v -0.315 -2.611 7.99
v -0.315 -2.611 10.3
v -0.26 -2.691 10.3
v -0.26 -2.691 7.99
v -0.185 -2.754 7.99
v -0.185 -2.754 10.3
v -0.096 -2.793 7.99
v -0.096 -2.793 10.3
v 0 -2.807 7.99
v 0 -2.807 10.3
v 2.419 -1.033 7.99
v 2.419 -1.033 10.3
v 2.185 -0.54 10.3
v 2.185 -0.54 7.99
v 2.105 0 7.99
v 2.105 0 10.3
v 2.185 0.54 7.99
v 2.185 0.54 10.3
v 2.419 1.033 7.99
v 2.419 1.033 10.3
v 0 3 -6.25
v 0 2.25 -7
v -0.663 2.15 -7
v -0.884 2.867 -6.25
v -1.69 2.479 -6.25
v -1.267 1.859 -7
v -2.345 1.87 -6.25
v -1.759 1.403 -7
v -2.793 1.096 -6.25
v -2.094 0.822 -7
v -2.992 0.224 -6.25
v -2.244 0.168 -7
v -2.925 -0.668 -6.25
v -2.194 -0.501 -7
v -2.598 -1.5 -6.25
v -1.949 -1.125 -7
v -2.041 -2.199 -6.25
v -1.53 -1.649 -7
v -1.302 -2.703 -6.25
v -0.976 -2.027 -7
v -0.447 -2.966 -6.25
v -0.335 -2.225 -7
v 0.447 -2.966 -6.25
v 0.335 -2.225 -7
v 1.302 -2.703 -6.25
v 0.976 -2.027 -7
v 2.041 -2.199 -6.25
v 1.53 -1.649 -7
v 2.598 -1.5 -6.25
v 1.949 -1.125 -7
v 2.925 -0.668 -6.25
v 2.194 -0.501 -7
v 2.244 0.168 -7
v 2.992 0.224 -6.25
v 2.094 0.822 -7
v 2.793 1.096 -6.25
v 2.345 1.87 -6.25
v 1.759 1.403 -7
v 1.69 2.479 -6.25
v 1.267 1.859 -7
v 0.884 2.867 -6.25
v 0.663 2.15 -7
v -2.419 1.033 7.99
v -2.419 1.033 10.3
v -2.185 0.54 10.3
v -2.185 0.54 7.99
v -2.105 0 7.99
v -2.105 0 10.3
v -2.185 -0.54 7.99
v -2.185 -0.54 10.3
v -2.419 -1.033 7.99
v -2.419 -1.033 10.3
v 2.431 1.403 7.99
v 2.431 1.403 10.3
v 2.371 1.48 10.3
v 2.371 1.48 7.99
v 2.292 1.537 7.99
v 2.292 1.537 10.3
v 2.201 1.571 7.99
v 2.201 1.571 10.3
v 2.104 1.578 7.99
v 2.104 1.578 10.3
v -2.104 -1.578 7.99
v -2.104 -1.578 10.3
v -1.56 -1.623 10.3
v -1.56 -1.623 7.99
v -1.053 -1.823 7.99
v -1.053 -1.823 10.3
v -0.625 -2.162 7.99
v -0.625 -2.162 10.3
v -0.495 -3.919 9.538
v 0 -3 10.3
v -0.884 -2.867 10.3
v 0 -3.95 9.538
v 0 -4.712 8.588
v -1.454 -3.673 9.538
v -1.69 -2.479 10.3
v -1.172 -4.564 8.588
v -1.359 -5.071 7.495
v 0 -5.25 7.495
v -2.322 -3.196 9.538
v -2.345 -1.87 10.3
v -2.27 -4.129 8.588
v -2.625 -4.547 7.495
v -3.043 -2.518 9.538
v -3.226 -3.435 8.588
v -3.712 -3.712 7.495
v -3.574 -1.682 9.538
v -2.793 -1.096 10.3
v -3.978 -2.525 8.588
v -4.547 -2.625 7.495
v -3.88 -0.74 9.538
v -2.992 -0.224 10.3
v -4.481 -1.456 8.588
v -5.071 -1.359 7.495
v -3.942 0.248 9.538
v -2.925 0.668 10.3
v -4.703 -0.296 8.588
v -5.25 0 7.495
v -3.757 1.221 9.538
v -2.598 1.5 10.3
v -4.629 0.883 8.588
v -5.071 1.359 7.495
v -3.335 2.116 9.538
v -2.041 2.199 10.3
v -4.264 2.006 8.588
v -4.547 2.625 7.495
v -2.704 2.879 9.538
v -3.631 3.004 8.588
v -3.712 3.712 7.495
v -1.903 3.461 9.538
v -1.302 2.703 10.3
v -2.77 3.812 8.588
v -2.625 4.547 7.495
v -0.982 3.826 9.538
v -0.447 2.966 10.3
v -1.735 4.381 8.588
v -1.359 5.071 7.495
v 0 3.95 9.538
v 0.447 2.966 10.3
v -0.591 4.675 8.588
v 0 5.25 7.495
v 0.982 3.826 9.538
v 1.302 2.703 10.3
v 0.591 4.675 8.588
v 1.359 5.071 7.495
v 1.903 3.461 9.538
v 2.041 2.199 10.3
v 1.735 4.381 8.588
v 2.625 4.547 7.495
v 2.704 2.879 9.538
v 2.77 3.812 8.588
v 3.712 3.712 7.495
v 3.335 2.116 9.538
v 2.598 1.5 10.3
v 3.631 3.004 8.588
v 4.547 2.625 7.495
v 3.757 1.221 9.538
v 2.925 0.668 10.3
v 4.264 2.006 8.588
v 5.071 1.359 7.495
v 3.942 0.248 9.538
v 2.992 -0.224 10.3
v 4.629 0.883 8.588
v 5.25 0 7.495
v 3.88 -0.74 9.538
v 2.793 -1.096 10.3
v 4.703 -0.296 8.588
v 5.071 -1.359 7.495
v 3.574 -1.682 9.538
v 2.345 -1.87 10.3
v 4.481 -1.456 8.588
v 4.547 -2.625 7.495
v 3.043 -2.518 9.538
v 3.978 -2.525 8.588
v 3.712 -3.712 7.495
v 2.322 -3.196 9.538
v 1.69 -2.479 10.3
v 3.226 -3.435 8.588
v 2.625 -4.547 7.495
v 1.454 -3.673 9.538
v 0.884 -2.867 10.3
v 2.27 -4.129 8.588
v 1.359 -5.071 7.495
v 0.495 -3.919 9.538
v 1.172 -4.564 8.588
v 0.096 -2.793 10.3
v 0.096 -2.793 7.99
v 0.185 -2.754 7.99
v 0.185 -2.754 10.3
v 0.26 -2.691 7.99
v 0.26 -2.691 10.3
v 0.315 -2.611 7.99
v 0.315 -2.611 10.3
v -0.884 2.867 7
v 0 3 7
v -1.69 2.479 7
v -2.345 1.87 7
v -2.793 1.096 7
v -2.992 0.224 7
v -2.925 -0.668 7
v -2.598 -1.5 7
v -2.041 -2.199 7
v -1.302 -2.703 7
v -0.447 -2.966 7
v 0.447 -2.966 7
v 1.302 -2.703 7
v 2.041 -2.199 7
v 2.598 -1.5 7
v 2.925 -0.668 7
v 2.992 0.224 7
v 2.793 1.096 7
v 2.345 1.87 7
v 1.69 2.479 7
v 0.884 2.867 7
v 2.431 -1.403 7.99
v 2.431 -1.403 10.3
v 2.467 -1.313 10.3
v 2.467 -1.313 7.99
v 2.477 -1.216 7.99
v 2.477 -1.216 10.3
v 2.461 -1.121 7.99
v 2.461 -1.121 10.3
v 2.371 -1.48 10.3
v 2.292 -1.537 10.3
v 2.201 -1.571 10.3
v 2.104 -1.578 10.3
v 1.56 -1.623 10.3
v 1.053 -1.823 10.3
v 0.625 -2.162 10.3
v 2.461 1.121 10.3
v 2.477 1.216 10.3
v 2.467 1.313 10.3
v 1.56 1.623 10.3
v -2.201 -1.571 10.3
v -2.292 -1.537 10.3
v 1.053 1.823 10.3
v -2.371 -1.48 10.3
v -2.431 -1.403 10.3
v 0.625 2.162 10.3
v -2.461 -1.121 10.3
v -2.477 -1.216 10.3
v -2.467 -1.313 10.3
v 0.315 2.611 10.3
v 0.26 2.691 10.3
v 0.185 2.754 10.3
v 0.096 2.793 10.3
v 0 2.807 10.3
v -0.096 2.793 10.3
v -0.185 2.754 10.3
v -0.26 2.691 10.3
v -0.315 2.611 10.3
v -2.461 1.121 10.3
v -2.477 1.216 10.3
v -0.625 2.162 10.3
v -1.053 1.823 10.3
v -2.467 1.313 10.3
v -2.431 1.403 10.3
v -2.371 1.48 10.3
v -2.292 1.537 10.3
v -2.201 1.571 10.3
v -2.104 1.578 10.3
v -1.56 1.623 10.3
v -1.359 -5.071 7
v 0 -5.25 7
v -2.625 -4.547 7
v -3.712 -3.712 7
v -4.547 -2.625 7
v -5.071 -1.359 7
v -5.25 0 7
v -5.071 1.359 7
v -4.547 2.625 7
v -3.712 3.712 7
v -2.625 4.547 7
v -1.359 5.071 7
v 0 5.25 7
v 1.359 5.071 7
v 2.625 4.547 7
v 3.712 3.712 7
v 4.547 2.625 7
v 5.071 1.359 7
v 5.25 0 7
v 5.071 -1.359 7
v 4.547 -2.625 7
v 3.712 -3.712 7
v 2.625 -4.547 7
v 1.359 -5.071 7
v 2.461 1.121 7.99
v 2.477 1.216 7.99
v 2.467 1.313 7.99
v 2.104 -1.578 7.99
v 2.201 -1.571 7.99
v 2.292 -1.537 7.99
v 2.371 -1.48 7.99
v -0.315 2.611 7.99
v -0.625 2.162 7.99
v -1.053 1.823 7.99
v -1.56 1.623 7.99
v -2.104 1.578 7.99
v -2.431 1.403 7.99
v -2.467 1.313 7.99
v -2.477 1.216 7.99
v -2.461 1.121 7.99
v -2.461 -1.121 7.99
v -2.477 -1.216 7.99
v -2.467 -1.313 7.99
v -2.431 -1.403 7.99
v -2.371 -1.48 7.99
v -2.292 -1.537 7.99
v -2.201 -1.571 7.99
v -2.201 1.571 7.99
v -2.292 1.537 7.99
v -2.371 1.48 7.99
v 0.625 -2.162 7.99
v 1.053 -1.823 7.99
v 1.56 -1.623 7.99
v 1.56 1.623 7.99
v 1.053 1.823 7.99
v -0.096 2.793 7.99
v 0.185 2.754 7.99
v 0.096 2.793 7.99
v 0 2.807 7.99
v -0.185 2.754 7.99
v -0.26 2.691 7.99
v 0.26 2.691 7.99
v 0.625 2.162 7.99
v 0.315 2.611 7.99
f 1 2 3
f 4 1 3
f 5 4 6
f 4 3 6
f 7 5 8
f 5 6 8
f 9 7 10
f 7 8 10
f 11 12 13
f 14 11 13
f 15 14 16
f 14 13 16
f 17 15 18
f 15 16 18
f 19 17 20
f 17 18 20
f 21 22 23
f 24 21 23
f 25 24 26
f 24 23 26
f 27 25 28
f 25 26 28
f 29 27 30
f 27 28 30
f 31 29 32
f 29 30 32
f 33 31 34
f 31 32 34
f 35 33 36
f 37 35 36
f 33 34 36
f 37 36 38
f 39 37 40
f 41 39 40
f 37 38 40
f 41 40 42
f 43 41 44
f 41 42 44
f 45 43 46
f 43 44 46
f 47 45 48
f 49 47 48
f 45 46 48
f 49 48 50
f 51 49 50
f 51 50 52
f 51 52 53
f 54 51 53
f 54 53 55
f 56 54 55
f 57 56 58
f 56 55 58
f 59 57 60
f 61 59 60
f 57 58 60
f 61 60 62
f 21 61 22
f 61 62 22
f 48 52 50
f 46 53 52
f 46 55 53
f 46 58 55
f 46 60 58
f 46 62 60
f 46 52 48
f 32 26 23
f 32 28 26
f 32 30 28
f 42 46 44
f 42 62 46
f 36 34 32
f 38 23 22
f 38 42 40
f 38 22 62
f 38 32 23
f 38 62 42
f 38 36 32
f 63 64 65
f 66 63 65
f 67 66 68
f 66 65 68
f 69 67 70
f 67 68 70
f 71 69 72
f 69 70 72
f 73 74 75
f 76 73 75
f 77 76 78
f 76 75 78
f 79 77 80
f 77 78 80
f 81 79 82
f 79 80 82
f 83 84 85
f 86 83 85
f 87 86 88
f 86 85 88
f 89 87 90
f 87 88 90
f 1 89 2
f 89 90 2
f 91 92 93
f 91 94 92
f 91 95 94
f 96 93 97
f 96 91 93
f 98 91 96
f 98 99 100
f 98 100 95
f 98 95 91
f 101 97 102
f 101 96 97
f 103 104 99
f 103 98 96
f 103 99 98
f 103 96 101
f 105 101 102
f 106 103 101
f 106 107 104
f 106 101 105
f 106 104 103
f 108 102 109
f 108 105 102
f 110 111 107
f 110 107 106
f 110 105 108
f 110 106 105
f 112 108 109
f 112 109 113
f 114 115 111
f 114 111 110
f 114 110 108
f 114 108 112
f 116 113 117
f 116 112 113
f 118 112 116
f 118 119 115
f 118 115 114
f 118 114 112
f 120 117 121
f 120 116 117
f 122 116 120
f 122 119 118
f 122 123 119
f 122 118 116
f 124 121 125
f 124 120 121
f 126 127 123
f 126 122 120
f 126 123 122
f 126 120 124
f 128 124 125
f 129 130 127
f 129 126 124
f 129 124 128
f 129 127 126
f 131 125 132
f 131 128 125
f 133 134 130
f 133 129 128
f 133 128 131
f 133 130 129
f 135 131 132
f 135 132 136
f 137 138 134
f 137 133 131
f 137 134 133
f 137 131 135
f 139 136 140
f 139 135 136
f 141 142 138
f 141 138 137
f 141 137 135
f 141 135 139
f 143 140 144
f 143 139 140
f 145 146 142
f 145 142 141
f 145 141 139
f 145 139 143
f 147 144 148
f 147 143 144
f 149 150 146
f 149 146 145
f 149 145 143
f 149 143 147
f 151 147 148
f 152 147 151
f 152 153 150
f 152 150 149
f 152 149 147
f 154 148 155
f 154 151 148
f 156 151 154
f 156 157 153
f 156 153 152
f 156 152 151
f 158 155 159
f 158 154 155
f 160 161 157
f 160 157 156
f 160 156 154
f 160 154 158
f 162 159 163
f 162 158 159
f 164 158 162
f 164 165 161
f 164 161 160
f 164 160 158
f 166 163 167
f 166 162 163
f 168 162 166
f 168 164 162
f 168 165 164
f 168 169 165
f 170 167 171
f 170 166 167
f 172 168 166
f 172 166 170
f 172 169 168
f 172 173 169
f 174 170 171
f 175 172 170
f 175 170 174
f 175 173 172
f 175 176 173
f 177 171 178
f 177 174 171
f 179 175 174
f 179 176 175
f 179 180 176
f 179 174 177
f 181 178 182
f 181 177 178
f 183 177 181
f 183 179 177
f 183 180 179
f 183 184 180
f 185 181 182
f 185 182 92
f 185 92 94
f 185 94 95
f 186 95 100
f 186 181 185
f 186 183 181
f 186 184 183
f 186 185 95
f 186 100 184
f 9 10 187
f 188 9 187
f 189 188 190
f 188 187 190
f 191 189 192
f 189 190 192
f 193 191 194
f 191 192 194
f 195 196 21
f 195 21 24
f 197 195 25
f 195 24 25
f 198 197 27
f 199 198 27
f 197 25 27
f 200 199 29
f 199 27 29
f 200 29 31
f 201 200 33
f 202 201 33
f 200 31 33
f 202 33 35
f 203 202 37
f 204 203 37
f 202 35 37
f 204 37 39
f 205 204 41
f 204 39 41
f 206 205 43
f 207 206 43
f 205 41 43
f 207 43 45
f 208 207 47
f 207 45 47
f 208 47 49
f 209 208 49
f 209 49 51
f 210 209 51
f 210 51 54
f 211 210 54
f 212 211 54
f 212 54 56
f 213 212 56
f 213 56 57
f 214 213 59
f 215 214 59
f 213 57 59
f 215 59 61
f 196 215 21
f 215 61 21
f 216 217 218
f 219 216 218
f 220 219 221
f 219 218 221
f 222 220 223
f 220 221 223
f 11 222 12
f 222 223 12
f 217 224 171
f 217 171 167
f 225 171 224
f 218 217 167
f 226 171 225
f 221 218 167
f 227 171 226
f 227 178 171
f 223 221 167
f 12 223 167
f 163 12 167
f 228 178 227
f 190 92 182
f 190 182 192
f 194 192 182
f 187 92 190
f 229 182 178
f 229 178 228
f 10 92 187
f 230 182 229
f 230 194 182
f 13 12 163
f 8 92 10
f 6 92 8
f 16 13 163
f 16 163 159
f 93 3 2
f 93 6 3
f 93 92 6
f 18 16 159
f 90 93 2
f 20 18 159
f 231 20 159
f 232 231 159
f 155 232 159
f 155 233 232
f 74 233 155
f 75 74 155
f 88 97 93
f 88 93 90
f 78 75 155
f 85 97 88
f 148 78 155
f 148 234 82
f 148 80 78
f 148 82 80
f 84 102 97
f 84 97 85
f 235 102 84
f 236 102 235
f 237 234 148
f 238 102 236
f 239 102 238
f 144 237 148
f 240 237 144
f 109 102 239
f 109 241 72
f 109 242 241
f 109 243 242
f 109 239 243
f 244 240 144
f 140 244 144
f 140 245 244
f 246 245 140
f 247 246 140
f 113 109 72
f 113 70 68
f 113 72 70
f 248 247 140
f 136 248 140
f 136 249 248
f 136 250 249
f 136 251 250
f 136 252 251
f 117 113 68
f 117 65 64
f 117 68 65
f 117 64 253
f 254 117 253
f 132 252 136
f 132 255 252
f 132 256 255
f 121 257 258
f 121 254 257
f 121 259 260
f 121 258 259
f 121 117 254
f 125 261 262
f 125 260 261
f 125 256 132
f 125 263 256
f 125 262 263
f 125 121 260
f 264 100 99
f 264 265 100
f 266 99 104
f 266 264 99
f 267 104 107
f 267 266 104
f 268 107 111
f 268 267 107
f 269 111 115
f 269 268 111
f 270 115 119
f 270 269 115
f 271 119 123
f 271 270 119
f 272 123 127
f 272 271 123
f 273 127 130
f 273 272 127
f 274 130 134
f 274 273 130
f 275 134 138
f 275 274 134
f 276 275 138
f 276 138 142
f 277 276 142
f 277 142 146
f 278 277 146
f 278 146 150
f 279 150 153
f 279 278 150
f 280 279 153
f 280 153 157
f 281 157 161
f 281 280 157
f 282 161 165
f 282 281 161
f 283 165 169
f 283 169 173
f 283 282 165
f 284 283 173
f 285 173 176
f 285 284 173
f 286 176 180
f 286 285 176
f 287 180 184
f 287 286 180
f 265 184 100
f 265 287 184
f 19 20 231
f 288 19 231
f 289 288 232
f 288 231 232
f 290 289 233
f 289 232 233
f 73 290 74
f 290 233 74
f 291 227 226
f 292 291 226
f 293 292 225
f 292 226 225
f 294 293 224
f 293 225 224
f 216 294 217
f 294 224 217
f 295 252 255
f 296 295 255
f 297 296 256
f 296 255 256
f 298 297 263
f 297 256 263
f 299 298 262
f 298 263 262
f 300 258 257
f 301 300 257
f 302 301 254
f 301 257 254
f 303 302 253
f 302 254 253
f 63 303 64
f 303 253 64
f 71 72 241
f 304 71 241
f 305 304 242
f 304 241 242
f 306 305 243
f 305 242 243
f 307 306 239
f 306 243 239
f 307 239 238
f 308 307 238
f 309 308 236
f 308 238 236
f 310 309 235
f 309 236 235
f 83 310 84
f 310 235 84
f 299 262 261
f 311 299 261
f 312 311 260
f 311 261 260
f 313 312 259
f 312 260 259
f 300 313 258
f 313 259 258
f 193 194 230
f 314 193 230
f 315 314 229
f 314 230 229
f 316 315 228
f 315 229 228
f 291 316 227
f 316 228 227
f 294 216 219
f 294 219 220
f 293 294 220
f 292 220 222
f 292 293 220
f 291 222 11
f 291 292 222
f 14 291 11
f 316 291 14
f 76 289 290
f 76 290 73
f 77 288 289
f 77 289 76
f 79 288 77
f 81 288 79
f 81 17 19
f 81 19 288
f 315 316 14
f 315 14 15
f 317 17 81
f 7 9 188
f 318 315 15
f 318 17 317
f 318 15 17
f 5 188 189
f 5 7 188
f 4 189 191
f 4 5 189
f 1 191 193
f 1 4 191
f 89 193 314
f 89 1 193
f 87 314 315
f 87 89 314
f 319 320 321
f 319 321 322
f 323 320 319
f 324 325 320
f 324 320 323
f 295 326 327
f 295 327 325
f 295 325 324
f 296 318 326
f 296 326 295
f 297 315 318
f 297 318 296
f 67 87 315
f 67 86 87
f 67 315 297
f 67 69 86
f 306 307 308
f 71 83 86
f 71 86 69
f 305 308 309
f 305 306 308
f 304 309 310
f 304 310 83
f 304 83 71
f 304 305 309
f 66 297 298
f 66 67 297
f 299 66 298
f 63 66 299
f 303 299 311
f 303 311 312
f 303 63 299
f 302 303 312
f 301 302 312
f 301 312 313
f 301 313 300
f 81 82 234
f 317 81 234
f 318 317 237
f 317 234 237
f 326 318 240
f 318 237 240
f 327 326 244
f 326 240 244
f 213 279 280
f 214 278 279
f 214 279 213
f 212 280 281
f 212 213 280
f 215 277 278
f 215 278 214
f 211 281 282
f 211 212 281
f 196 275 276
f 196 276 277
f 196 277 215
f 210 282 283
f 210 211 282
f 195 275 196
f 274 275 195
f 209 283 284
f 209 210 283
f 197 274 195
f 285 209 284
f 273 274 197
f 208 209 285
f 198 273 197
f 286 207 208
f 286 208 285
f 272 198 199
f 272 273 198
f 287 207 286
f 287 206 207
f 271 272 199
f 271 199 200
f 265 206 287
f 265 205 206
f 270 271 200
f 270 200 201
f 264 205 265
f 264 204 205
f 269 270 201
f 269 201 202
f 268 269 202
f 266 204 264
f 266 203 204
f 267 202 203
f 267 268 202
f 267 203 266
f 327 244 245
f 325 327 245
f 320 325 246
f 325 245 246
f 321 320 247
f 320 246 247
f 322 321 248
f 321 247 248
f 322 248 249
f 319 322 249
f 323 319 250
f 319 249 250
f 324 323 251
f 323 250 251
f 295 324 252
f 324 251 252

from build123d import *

# Parameters (mm, degrees)
SKETCH12_W         = 14
SKETCH12_H         = 3
CUT_EXTRUDE4_DEPTH = 2.31
CIRPATTERN1_COUNT  = 6
CHAMFER1_SIZE      = 0.75


with BuildPart() as part:
    # Sketch12 → Revolve1 (revolve)
    with BuildSketch(Plane(origin=(0, 0, 0), x_dir=(0, 0, -1), z_dir=(1, 0, 0))):
        with Locations((0, 1.5)):
            Rectangle(SKETCH12_W, SKETCH12_H)
    revolve(axis=Axis((0, 0, -7), (0, 0, 1)))

    # Sketch7 → Revolve2 (revolve)
    with BuildSketch(Plane(origin=(0, 0, 0), x_dir=(0, 0, -1), z_dir=(1, 0, 0))):
        with BuildLine():
            Line((-7.495, 5.25), (-7, 5.25))
            Line((-7, 5.25), (-7, 0))
            Line((-7, 0), (-10.3, 0))
            Line((-10.3, 0), (-10.3, 3))
            ThreePointArc((-10.3, 3), (-9.083520981, 4.356906156), (-7.495, 5.25))
        make_face()
    revolve(axis=Axis((0, 0, 10.3), (0, 0, -1)))

    # Sketch11 → Cut-Extrude4 (cut)
    with BuildSketch(Plane.XY.offset(10.3)):
        with BuildLine():
            Line((0, 0), (-2.430673501, 1.40335))
            ThreePointArc((-2.430673501, 1.40335), (-2.477487573, 1.216409562), (-2.418502657, 1.032945493))
            ThreePointArc((-2.418502657, 1.032945493), (-2.105025, 0), (-2.418502657, -1.032945493))
            ThreePointArc((-2.418502657, -1.032945493), (-2.477487573, -1.216409562), (-2.430673501, -1.40335))
            Line((-2.430673501, -1.40335), (0, 0))
        make_face()
    cut_extrude4 = extrude(amount=-CUT_EXTRUDE4_DEPTH, mode=Mode.SUBTRACT)

    # CirPattern1: Cut-Extrude4 ×6 about axis
    cirpattern1_axis = Axis((0, 0, 0), (0, 0, -1))
    for i in range(1, CIRPATTERN1_COUNT):
        add(cut_extrude4.rotate(cirpattern1_axis, i * 360 / CIRPATTERN1_COUNT), mode=Mode.SUBTRACT)

    # Chamfer1
    chamfer1_edges = [part.edges().sort_by_distance(p)[0] for p in [
        (0, -3, -7),
    ]]
    chamfer(chamfer1_edges, length=CHAMFER1_SIZE)


solid = part.part
